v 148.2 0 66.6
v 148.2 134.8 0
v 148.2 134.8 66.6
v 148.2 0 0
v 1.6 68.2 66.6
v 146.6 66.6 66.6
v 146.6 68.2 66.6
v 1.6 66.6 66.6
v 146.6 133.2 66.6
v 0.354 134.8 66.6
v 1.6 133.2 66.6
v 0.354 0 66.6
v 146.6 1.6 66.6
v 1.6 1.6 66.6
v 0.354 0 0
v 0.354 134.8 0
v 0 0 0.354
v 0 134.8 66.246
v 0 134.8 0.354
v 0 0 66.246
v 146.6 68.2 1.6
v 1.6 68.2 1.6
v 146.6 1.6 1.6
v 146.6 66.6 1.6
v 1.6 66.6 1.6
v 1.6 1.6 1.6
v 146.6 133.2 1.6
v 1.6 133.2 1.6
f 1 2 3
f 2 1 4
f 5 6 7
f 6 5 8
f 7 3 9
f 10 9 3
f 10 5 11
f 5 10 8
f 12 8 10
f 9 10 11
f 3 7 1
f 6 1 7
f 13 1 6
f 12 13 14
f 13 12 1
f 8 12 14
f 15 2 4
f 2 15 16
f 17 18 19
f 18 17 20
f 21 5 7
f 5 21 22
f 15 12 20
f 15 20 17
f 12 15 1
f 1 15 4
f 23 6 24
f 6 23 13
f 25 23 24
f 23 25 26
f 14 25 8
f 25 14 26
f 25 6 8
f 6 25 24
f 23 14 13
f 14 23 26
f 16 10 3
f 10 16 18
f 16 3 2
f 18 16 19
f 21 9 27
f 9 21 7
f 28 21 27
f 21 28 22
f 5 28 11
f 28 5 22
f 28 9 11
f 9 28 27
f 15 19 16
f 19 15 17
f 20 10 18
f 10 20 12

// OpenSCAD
length=145;
depth=65;
height=65;
wall=1.6;
//wall=.5;
spacing=depth+wall;
camfer=.5;

difference() {
    union() {
        holder();
        translate([0,depth+wall,0]) holder();
    }
    rotate([0,45,0]) translate([-camfer/2,0,-camfer/2]) cube([camfer,200,camfer]);
    translate([0,0,height+wall]) rotate([0,45,0]) translate([-camfer/2,0,-camfer/2]) cube([camfer,200,camfer]);
}
module holder() {
    difference() {
        cube([length+wall*2, depth+wall*2, height+wall]);
        translate([wall,wall,wall])
            cube([length, depth, height]);
    }
}
//russ dunkly
